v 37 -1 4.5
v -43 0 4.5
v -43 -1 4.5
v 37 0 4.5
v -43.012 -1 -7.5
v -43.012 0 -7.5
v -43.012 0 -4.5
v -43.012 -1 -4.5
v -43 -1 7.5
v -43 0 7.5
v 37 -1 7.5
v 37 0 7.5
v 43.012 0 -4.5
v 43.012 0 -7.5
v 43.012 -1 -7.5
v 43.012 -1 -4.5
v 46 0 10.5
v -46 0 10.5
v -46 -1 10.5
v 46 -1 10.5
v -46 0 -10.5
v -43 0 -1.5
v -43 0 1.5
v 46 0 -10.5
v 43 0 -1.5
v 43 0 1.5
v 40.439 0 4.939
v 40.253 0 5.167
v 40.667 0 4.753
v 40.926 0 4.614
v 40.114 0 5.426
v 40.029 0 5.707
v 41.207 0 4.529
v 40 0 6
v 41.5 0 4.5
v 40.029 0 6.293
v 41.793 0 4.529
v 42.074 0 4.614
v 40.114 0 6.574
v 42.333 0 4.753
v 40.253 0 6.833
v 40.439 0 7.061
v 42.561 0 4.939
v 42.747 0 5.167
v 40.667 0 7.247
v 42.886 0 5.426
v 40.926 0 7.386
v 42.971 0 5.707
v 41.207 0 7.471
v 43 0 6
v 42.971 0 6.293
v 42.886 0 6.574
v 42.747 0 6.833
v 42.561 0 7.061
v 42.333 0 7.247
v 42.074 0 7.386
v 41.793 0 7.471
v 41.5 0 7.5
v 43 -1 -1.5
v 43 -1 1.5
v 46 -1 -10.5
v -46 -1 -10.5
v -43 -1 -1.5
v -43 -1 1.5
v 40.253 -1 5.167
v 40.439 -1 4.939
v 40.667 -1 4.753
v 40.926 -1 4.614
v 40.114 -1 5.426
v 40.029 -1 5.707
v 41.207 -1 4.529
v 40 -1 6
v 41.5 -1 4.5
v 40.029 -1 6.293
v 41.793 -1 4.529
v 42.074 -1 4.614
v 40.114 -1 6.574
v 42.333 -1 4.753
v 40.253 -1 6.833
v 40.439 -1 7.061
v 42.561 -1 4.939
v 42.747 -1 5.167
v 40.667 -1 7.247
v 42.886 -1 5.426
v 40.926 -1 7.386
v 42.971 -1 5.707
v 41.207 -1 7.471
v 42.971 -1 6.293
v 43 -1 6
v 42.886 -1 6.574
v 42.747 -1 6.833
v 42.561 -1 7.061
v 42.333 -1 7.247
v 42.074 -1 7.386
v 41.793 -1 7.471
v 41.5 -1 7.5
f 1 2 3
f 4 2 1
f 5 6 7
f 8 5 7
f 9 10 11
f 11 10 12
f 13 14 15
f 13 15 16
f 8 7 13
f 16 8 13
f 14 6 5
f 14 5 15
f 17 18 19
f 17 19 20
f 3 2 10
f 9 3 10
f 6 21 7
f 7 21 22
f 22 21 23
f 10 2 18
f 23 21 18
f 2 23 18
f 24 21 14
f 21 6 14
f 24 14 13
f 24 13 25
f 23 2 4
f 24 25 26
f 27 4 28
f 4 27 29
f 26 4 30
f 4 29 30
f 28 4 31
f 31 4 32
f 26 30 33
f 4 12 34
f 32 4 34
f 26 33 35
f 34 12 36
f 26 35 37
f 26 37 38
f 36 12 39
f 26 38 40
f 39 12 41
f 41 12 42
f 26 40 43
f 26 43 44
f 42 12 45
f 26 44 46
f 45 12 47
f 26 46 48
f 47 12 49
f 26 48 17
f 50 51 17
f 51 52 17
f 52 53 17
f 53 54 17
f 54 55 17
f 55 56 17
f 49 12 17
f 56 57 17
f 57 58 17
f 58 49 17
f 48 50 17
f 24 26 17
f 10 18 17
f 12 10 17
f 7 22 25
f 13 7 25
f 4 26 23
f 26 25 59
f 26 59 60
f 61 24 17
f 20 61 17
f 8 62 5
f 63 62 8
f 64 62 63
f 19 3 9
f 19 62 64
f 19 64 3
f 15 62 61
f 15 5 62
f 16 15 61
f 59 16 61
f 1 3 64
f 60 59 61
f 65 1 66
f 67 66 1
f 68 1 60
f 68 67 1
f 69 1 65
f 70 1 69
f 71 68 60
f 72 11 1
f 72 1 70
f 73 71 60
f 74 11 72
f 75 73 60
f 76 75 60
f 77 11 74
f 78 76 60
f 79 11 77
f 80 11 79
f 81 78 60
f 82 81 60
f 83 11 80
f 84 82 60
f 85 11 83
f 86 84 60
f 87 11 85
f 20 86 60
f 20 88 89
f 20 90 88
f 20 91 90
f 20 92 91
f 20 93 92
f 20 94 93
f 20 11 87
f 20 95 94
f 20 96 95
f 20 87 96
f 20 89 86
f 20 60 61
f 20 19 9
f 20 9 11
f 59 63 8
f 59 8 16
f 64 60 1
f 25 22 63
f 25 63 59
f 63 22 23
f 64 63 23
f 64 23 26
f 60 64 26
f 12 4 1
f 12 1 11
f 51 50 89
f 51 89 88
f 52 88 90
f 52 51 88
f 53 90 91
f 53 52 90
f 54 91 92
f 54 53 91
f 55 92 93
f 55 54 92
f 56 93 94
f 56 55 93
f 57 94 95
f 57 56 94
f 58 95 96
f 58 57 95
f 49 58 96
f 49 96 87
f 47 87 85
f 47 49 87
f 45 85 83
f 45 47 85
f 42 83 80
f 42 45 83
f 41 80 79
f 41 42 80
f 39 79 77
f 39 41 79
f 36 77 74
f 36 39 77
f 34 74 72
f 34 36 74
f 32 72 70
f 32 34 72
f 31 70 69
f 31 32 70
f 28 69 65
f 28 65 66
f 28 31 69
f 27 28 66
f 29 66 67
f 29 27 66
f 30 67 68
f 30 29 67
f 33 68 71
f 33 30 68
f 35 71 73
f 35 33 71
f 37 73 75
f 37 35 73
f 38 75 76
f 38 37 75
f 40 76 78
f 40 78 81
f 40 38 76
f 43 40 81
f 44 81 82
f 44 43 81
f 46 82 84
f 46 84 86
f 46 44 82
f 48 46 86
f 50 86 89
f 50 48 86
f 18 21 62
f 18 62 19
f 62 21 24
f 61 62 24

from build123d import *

# Parameters (mm, degrees)
F0_W     = 92
F0_H     = 21
F0_W_2   = 86.023346
F0_H_2   = 3
F0_W_3   = 80
F0_W_4   = 86
F0_R     = 1.5
F1_DEPTH = 1


with BuildPart() as f1:
    # F0 (on Front) → F1 (new body)
    with BuildSketch(Plane.XZ):
        Rectangle(F0_W, F0_H)
        with Locations((0, -6)):
            Rectangle(F0_W_2, F0_H_2, mode=Mode.SUBTRACT)
        with Locations((-3, 6)):
            Rectangle(F0_W_3, F0_H_2, mode=Mode.SUBTRACT)
        Rectangle(F0_W_4, F0_H_2, mode=Mode.SUBTRACT)
        with Locations((41.5, 6)):
            Circle(F0_R, mode=Mode.SUBTRACT)
    extrude(amount=F1_DEPTH)


solid = f1.part
